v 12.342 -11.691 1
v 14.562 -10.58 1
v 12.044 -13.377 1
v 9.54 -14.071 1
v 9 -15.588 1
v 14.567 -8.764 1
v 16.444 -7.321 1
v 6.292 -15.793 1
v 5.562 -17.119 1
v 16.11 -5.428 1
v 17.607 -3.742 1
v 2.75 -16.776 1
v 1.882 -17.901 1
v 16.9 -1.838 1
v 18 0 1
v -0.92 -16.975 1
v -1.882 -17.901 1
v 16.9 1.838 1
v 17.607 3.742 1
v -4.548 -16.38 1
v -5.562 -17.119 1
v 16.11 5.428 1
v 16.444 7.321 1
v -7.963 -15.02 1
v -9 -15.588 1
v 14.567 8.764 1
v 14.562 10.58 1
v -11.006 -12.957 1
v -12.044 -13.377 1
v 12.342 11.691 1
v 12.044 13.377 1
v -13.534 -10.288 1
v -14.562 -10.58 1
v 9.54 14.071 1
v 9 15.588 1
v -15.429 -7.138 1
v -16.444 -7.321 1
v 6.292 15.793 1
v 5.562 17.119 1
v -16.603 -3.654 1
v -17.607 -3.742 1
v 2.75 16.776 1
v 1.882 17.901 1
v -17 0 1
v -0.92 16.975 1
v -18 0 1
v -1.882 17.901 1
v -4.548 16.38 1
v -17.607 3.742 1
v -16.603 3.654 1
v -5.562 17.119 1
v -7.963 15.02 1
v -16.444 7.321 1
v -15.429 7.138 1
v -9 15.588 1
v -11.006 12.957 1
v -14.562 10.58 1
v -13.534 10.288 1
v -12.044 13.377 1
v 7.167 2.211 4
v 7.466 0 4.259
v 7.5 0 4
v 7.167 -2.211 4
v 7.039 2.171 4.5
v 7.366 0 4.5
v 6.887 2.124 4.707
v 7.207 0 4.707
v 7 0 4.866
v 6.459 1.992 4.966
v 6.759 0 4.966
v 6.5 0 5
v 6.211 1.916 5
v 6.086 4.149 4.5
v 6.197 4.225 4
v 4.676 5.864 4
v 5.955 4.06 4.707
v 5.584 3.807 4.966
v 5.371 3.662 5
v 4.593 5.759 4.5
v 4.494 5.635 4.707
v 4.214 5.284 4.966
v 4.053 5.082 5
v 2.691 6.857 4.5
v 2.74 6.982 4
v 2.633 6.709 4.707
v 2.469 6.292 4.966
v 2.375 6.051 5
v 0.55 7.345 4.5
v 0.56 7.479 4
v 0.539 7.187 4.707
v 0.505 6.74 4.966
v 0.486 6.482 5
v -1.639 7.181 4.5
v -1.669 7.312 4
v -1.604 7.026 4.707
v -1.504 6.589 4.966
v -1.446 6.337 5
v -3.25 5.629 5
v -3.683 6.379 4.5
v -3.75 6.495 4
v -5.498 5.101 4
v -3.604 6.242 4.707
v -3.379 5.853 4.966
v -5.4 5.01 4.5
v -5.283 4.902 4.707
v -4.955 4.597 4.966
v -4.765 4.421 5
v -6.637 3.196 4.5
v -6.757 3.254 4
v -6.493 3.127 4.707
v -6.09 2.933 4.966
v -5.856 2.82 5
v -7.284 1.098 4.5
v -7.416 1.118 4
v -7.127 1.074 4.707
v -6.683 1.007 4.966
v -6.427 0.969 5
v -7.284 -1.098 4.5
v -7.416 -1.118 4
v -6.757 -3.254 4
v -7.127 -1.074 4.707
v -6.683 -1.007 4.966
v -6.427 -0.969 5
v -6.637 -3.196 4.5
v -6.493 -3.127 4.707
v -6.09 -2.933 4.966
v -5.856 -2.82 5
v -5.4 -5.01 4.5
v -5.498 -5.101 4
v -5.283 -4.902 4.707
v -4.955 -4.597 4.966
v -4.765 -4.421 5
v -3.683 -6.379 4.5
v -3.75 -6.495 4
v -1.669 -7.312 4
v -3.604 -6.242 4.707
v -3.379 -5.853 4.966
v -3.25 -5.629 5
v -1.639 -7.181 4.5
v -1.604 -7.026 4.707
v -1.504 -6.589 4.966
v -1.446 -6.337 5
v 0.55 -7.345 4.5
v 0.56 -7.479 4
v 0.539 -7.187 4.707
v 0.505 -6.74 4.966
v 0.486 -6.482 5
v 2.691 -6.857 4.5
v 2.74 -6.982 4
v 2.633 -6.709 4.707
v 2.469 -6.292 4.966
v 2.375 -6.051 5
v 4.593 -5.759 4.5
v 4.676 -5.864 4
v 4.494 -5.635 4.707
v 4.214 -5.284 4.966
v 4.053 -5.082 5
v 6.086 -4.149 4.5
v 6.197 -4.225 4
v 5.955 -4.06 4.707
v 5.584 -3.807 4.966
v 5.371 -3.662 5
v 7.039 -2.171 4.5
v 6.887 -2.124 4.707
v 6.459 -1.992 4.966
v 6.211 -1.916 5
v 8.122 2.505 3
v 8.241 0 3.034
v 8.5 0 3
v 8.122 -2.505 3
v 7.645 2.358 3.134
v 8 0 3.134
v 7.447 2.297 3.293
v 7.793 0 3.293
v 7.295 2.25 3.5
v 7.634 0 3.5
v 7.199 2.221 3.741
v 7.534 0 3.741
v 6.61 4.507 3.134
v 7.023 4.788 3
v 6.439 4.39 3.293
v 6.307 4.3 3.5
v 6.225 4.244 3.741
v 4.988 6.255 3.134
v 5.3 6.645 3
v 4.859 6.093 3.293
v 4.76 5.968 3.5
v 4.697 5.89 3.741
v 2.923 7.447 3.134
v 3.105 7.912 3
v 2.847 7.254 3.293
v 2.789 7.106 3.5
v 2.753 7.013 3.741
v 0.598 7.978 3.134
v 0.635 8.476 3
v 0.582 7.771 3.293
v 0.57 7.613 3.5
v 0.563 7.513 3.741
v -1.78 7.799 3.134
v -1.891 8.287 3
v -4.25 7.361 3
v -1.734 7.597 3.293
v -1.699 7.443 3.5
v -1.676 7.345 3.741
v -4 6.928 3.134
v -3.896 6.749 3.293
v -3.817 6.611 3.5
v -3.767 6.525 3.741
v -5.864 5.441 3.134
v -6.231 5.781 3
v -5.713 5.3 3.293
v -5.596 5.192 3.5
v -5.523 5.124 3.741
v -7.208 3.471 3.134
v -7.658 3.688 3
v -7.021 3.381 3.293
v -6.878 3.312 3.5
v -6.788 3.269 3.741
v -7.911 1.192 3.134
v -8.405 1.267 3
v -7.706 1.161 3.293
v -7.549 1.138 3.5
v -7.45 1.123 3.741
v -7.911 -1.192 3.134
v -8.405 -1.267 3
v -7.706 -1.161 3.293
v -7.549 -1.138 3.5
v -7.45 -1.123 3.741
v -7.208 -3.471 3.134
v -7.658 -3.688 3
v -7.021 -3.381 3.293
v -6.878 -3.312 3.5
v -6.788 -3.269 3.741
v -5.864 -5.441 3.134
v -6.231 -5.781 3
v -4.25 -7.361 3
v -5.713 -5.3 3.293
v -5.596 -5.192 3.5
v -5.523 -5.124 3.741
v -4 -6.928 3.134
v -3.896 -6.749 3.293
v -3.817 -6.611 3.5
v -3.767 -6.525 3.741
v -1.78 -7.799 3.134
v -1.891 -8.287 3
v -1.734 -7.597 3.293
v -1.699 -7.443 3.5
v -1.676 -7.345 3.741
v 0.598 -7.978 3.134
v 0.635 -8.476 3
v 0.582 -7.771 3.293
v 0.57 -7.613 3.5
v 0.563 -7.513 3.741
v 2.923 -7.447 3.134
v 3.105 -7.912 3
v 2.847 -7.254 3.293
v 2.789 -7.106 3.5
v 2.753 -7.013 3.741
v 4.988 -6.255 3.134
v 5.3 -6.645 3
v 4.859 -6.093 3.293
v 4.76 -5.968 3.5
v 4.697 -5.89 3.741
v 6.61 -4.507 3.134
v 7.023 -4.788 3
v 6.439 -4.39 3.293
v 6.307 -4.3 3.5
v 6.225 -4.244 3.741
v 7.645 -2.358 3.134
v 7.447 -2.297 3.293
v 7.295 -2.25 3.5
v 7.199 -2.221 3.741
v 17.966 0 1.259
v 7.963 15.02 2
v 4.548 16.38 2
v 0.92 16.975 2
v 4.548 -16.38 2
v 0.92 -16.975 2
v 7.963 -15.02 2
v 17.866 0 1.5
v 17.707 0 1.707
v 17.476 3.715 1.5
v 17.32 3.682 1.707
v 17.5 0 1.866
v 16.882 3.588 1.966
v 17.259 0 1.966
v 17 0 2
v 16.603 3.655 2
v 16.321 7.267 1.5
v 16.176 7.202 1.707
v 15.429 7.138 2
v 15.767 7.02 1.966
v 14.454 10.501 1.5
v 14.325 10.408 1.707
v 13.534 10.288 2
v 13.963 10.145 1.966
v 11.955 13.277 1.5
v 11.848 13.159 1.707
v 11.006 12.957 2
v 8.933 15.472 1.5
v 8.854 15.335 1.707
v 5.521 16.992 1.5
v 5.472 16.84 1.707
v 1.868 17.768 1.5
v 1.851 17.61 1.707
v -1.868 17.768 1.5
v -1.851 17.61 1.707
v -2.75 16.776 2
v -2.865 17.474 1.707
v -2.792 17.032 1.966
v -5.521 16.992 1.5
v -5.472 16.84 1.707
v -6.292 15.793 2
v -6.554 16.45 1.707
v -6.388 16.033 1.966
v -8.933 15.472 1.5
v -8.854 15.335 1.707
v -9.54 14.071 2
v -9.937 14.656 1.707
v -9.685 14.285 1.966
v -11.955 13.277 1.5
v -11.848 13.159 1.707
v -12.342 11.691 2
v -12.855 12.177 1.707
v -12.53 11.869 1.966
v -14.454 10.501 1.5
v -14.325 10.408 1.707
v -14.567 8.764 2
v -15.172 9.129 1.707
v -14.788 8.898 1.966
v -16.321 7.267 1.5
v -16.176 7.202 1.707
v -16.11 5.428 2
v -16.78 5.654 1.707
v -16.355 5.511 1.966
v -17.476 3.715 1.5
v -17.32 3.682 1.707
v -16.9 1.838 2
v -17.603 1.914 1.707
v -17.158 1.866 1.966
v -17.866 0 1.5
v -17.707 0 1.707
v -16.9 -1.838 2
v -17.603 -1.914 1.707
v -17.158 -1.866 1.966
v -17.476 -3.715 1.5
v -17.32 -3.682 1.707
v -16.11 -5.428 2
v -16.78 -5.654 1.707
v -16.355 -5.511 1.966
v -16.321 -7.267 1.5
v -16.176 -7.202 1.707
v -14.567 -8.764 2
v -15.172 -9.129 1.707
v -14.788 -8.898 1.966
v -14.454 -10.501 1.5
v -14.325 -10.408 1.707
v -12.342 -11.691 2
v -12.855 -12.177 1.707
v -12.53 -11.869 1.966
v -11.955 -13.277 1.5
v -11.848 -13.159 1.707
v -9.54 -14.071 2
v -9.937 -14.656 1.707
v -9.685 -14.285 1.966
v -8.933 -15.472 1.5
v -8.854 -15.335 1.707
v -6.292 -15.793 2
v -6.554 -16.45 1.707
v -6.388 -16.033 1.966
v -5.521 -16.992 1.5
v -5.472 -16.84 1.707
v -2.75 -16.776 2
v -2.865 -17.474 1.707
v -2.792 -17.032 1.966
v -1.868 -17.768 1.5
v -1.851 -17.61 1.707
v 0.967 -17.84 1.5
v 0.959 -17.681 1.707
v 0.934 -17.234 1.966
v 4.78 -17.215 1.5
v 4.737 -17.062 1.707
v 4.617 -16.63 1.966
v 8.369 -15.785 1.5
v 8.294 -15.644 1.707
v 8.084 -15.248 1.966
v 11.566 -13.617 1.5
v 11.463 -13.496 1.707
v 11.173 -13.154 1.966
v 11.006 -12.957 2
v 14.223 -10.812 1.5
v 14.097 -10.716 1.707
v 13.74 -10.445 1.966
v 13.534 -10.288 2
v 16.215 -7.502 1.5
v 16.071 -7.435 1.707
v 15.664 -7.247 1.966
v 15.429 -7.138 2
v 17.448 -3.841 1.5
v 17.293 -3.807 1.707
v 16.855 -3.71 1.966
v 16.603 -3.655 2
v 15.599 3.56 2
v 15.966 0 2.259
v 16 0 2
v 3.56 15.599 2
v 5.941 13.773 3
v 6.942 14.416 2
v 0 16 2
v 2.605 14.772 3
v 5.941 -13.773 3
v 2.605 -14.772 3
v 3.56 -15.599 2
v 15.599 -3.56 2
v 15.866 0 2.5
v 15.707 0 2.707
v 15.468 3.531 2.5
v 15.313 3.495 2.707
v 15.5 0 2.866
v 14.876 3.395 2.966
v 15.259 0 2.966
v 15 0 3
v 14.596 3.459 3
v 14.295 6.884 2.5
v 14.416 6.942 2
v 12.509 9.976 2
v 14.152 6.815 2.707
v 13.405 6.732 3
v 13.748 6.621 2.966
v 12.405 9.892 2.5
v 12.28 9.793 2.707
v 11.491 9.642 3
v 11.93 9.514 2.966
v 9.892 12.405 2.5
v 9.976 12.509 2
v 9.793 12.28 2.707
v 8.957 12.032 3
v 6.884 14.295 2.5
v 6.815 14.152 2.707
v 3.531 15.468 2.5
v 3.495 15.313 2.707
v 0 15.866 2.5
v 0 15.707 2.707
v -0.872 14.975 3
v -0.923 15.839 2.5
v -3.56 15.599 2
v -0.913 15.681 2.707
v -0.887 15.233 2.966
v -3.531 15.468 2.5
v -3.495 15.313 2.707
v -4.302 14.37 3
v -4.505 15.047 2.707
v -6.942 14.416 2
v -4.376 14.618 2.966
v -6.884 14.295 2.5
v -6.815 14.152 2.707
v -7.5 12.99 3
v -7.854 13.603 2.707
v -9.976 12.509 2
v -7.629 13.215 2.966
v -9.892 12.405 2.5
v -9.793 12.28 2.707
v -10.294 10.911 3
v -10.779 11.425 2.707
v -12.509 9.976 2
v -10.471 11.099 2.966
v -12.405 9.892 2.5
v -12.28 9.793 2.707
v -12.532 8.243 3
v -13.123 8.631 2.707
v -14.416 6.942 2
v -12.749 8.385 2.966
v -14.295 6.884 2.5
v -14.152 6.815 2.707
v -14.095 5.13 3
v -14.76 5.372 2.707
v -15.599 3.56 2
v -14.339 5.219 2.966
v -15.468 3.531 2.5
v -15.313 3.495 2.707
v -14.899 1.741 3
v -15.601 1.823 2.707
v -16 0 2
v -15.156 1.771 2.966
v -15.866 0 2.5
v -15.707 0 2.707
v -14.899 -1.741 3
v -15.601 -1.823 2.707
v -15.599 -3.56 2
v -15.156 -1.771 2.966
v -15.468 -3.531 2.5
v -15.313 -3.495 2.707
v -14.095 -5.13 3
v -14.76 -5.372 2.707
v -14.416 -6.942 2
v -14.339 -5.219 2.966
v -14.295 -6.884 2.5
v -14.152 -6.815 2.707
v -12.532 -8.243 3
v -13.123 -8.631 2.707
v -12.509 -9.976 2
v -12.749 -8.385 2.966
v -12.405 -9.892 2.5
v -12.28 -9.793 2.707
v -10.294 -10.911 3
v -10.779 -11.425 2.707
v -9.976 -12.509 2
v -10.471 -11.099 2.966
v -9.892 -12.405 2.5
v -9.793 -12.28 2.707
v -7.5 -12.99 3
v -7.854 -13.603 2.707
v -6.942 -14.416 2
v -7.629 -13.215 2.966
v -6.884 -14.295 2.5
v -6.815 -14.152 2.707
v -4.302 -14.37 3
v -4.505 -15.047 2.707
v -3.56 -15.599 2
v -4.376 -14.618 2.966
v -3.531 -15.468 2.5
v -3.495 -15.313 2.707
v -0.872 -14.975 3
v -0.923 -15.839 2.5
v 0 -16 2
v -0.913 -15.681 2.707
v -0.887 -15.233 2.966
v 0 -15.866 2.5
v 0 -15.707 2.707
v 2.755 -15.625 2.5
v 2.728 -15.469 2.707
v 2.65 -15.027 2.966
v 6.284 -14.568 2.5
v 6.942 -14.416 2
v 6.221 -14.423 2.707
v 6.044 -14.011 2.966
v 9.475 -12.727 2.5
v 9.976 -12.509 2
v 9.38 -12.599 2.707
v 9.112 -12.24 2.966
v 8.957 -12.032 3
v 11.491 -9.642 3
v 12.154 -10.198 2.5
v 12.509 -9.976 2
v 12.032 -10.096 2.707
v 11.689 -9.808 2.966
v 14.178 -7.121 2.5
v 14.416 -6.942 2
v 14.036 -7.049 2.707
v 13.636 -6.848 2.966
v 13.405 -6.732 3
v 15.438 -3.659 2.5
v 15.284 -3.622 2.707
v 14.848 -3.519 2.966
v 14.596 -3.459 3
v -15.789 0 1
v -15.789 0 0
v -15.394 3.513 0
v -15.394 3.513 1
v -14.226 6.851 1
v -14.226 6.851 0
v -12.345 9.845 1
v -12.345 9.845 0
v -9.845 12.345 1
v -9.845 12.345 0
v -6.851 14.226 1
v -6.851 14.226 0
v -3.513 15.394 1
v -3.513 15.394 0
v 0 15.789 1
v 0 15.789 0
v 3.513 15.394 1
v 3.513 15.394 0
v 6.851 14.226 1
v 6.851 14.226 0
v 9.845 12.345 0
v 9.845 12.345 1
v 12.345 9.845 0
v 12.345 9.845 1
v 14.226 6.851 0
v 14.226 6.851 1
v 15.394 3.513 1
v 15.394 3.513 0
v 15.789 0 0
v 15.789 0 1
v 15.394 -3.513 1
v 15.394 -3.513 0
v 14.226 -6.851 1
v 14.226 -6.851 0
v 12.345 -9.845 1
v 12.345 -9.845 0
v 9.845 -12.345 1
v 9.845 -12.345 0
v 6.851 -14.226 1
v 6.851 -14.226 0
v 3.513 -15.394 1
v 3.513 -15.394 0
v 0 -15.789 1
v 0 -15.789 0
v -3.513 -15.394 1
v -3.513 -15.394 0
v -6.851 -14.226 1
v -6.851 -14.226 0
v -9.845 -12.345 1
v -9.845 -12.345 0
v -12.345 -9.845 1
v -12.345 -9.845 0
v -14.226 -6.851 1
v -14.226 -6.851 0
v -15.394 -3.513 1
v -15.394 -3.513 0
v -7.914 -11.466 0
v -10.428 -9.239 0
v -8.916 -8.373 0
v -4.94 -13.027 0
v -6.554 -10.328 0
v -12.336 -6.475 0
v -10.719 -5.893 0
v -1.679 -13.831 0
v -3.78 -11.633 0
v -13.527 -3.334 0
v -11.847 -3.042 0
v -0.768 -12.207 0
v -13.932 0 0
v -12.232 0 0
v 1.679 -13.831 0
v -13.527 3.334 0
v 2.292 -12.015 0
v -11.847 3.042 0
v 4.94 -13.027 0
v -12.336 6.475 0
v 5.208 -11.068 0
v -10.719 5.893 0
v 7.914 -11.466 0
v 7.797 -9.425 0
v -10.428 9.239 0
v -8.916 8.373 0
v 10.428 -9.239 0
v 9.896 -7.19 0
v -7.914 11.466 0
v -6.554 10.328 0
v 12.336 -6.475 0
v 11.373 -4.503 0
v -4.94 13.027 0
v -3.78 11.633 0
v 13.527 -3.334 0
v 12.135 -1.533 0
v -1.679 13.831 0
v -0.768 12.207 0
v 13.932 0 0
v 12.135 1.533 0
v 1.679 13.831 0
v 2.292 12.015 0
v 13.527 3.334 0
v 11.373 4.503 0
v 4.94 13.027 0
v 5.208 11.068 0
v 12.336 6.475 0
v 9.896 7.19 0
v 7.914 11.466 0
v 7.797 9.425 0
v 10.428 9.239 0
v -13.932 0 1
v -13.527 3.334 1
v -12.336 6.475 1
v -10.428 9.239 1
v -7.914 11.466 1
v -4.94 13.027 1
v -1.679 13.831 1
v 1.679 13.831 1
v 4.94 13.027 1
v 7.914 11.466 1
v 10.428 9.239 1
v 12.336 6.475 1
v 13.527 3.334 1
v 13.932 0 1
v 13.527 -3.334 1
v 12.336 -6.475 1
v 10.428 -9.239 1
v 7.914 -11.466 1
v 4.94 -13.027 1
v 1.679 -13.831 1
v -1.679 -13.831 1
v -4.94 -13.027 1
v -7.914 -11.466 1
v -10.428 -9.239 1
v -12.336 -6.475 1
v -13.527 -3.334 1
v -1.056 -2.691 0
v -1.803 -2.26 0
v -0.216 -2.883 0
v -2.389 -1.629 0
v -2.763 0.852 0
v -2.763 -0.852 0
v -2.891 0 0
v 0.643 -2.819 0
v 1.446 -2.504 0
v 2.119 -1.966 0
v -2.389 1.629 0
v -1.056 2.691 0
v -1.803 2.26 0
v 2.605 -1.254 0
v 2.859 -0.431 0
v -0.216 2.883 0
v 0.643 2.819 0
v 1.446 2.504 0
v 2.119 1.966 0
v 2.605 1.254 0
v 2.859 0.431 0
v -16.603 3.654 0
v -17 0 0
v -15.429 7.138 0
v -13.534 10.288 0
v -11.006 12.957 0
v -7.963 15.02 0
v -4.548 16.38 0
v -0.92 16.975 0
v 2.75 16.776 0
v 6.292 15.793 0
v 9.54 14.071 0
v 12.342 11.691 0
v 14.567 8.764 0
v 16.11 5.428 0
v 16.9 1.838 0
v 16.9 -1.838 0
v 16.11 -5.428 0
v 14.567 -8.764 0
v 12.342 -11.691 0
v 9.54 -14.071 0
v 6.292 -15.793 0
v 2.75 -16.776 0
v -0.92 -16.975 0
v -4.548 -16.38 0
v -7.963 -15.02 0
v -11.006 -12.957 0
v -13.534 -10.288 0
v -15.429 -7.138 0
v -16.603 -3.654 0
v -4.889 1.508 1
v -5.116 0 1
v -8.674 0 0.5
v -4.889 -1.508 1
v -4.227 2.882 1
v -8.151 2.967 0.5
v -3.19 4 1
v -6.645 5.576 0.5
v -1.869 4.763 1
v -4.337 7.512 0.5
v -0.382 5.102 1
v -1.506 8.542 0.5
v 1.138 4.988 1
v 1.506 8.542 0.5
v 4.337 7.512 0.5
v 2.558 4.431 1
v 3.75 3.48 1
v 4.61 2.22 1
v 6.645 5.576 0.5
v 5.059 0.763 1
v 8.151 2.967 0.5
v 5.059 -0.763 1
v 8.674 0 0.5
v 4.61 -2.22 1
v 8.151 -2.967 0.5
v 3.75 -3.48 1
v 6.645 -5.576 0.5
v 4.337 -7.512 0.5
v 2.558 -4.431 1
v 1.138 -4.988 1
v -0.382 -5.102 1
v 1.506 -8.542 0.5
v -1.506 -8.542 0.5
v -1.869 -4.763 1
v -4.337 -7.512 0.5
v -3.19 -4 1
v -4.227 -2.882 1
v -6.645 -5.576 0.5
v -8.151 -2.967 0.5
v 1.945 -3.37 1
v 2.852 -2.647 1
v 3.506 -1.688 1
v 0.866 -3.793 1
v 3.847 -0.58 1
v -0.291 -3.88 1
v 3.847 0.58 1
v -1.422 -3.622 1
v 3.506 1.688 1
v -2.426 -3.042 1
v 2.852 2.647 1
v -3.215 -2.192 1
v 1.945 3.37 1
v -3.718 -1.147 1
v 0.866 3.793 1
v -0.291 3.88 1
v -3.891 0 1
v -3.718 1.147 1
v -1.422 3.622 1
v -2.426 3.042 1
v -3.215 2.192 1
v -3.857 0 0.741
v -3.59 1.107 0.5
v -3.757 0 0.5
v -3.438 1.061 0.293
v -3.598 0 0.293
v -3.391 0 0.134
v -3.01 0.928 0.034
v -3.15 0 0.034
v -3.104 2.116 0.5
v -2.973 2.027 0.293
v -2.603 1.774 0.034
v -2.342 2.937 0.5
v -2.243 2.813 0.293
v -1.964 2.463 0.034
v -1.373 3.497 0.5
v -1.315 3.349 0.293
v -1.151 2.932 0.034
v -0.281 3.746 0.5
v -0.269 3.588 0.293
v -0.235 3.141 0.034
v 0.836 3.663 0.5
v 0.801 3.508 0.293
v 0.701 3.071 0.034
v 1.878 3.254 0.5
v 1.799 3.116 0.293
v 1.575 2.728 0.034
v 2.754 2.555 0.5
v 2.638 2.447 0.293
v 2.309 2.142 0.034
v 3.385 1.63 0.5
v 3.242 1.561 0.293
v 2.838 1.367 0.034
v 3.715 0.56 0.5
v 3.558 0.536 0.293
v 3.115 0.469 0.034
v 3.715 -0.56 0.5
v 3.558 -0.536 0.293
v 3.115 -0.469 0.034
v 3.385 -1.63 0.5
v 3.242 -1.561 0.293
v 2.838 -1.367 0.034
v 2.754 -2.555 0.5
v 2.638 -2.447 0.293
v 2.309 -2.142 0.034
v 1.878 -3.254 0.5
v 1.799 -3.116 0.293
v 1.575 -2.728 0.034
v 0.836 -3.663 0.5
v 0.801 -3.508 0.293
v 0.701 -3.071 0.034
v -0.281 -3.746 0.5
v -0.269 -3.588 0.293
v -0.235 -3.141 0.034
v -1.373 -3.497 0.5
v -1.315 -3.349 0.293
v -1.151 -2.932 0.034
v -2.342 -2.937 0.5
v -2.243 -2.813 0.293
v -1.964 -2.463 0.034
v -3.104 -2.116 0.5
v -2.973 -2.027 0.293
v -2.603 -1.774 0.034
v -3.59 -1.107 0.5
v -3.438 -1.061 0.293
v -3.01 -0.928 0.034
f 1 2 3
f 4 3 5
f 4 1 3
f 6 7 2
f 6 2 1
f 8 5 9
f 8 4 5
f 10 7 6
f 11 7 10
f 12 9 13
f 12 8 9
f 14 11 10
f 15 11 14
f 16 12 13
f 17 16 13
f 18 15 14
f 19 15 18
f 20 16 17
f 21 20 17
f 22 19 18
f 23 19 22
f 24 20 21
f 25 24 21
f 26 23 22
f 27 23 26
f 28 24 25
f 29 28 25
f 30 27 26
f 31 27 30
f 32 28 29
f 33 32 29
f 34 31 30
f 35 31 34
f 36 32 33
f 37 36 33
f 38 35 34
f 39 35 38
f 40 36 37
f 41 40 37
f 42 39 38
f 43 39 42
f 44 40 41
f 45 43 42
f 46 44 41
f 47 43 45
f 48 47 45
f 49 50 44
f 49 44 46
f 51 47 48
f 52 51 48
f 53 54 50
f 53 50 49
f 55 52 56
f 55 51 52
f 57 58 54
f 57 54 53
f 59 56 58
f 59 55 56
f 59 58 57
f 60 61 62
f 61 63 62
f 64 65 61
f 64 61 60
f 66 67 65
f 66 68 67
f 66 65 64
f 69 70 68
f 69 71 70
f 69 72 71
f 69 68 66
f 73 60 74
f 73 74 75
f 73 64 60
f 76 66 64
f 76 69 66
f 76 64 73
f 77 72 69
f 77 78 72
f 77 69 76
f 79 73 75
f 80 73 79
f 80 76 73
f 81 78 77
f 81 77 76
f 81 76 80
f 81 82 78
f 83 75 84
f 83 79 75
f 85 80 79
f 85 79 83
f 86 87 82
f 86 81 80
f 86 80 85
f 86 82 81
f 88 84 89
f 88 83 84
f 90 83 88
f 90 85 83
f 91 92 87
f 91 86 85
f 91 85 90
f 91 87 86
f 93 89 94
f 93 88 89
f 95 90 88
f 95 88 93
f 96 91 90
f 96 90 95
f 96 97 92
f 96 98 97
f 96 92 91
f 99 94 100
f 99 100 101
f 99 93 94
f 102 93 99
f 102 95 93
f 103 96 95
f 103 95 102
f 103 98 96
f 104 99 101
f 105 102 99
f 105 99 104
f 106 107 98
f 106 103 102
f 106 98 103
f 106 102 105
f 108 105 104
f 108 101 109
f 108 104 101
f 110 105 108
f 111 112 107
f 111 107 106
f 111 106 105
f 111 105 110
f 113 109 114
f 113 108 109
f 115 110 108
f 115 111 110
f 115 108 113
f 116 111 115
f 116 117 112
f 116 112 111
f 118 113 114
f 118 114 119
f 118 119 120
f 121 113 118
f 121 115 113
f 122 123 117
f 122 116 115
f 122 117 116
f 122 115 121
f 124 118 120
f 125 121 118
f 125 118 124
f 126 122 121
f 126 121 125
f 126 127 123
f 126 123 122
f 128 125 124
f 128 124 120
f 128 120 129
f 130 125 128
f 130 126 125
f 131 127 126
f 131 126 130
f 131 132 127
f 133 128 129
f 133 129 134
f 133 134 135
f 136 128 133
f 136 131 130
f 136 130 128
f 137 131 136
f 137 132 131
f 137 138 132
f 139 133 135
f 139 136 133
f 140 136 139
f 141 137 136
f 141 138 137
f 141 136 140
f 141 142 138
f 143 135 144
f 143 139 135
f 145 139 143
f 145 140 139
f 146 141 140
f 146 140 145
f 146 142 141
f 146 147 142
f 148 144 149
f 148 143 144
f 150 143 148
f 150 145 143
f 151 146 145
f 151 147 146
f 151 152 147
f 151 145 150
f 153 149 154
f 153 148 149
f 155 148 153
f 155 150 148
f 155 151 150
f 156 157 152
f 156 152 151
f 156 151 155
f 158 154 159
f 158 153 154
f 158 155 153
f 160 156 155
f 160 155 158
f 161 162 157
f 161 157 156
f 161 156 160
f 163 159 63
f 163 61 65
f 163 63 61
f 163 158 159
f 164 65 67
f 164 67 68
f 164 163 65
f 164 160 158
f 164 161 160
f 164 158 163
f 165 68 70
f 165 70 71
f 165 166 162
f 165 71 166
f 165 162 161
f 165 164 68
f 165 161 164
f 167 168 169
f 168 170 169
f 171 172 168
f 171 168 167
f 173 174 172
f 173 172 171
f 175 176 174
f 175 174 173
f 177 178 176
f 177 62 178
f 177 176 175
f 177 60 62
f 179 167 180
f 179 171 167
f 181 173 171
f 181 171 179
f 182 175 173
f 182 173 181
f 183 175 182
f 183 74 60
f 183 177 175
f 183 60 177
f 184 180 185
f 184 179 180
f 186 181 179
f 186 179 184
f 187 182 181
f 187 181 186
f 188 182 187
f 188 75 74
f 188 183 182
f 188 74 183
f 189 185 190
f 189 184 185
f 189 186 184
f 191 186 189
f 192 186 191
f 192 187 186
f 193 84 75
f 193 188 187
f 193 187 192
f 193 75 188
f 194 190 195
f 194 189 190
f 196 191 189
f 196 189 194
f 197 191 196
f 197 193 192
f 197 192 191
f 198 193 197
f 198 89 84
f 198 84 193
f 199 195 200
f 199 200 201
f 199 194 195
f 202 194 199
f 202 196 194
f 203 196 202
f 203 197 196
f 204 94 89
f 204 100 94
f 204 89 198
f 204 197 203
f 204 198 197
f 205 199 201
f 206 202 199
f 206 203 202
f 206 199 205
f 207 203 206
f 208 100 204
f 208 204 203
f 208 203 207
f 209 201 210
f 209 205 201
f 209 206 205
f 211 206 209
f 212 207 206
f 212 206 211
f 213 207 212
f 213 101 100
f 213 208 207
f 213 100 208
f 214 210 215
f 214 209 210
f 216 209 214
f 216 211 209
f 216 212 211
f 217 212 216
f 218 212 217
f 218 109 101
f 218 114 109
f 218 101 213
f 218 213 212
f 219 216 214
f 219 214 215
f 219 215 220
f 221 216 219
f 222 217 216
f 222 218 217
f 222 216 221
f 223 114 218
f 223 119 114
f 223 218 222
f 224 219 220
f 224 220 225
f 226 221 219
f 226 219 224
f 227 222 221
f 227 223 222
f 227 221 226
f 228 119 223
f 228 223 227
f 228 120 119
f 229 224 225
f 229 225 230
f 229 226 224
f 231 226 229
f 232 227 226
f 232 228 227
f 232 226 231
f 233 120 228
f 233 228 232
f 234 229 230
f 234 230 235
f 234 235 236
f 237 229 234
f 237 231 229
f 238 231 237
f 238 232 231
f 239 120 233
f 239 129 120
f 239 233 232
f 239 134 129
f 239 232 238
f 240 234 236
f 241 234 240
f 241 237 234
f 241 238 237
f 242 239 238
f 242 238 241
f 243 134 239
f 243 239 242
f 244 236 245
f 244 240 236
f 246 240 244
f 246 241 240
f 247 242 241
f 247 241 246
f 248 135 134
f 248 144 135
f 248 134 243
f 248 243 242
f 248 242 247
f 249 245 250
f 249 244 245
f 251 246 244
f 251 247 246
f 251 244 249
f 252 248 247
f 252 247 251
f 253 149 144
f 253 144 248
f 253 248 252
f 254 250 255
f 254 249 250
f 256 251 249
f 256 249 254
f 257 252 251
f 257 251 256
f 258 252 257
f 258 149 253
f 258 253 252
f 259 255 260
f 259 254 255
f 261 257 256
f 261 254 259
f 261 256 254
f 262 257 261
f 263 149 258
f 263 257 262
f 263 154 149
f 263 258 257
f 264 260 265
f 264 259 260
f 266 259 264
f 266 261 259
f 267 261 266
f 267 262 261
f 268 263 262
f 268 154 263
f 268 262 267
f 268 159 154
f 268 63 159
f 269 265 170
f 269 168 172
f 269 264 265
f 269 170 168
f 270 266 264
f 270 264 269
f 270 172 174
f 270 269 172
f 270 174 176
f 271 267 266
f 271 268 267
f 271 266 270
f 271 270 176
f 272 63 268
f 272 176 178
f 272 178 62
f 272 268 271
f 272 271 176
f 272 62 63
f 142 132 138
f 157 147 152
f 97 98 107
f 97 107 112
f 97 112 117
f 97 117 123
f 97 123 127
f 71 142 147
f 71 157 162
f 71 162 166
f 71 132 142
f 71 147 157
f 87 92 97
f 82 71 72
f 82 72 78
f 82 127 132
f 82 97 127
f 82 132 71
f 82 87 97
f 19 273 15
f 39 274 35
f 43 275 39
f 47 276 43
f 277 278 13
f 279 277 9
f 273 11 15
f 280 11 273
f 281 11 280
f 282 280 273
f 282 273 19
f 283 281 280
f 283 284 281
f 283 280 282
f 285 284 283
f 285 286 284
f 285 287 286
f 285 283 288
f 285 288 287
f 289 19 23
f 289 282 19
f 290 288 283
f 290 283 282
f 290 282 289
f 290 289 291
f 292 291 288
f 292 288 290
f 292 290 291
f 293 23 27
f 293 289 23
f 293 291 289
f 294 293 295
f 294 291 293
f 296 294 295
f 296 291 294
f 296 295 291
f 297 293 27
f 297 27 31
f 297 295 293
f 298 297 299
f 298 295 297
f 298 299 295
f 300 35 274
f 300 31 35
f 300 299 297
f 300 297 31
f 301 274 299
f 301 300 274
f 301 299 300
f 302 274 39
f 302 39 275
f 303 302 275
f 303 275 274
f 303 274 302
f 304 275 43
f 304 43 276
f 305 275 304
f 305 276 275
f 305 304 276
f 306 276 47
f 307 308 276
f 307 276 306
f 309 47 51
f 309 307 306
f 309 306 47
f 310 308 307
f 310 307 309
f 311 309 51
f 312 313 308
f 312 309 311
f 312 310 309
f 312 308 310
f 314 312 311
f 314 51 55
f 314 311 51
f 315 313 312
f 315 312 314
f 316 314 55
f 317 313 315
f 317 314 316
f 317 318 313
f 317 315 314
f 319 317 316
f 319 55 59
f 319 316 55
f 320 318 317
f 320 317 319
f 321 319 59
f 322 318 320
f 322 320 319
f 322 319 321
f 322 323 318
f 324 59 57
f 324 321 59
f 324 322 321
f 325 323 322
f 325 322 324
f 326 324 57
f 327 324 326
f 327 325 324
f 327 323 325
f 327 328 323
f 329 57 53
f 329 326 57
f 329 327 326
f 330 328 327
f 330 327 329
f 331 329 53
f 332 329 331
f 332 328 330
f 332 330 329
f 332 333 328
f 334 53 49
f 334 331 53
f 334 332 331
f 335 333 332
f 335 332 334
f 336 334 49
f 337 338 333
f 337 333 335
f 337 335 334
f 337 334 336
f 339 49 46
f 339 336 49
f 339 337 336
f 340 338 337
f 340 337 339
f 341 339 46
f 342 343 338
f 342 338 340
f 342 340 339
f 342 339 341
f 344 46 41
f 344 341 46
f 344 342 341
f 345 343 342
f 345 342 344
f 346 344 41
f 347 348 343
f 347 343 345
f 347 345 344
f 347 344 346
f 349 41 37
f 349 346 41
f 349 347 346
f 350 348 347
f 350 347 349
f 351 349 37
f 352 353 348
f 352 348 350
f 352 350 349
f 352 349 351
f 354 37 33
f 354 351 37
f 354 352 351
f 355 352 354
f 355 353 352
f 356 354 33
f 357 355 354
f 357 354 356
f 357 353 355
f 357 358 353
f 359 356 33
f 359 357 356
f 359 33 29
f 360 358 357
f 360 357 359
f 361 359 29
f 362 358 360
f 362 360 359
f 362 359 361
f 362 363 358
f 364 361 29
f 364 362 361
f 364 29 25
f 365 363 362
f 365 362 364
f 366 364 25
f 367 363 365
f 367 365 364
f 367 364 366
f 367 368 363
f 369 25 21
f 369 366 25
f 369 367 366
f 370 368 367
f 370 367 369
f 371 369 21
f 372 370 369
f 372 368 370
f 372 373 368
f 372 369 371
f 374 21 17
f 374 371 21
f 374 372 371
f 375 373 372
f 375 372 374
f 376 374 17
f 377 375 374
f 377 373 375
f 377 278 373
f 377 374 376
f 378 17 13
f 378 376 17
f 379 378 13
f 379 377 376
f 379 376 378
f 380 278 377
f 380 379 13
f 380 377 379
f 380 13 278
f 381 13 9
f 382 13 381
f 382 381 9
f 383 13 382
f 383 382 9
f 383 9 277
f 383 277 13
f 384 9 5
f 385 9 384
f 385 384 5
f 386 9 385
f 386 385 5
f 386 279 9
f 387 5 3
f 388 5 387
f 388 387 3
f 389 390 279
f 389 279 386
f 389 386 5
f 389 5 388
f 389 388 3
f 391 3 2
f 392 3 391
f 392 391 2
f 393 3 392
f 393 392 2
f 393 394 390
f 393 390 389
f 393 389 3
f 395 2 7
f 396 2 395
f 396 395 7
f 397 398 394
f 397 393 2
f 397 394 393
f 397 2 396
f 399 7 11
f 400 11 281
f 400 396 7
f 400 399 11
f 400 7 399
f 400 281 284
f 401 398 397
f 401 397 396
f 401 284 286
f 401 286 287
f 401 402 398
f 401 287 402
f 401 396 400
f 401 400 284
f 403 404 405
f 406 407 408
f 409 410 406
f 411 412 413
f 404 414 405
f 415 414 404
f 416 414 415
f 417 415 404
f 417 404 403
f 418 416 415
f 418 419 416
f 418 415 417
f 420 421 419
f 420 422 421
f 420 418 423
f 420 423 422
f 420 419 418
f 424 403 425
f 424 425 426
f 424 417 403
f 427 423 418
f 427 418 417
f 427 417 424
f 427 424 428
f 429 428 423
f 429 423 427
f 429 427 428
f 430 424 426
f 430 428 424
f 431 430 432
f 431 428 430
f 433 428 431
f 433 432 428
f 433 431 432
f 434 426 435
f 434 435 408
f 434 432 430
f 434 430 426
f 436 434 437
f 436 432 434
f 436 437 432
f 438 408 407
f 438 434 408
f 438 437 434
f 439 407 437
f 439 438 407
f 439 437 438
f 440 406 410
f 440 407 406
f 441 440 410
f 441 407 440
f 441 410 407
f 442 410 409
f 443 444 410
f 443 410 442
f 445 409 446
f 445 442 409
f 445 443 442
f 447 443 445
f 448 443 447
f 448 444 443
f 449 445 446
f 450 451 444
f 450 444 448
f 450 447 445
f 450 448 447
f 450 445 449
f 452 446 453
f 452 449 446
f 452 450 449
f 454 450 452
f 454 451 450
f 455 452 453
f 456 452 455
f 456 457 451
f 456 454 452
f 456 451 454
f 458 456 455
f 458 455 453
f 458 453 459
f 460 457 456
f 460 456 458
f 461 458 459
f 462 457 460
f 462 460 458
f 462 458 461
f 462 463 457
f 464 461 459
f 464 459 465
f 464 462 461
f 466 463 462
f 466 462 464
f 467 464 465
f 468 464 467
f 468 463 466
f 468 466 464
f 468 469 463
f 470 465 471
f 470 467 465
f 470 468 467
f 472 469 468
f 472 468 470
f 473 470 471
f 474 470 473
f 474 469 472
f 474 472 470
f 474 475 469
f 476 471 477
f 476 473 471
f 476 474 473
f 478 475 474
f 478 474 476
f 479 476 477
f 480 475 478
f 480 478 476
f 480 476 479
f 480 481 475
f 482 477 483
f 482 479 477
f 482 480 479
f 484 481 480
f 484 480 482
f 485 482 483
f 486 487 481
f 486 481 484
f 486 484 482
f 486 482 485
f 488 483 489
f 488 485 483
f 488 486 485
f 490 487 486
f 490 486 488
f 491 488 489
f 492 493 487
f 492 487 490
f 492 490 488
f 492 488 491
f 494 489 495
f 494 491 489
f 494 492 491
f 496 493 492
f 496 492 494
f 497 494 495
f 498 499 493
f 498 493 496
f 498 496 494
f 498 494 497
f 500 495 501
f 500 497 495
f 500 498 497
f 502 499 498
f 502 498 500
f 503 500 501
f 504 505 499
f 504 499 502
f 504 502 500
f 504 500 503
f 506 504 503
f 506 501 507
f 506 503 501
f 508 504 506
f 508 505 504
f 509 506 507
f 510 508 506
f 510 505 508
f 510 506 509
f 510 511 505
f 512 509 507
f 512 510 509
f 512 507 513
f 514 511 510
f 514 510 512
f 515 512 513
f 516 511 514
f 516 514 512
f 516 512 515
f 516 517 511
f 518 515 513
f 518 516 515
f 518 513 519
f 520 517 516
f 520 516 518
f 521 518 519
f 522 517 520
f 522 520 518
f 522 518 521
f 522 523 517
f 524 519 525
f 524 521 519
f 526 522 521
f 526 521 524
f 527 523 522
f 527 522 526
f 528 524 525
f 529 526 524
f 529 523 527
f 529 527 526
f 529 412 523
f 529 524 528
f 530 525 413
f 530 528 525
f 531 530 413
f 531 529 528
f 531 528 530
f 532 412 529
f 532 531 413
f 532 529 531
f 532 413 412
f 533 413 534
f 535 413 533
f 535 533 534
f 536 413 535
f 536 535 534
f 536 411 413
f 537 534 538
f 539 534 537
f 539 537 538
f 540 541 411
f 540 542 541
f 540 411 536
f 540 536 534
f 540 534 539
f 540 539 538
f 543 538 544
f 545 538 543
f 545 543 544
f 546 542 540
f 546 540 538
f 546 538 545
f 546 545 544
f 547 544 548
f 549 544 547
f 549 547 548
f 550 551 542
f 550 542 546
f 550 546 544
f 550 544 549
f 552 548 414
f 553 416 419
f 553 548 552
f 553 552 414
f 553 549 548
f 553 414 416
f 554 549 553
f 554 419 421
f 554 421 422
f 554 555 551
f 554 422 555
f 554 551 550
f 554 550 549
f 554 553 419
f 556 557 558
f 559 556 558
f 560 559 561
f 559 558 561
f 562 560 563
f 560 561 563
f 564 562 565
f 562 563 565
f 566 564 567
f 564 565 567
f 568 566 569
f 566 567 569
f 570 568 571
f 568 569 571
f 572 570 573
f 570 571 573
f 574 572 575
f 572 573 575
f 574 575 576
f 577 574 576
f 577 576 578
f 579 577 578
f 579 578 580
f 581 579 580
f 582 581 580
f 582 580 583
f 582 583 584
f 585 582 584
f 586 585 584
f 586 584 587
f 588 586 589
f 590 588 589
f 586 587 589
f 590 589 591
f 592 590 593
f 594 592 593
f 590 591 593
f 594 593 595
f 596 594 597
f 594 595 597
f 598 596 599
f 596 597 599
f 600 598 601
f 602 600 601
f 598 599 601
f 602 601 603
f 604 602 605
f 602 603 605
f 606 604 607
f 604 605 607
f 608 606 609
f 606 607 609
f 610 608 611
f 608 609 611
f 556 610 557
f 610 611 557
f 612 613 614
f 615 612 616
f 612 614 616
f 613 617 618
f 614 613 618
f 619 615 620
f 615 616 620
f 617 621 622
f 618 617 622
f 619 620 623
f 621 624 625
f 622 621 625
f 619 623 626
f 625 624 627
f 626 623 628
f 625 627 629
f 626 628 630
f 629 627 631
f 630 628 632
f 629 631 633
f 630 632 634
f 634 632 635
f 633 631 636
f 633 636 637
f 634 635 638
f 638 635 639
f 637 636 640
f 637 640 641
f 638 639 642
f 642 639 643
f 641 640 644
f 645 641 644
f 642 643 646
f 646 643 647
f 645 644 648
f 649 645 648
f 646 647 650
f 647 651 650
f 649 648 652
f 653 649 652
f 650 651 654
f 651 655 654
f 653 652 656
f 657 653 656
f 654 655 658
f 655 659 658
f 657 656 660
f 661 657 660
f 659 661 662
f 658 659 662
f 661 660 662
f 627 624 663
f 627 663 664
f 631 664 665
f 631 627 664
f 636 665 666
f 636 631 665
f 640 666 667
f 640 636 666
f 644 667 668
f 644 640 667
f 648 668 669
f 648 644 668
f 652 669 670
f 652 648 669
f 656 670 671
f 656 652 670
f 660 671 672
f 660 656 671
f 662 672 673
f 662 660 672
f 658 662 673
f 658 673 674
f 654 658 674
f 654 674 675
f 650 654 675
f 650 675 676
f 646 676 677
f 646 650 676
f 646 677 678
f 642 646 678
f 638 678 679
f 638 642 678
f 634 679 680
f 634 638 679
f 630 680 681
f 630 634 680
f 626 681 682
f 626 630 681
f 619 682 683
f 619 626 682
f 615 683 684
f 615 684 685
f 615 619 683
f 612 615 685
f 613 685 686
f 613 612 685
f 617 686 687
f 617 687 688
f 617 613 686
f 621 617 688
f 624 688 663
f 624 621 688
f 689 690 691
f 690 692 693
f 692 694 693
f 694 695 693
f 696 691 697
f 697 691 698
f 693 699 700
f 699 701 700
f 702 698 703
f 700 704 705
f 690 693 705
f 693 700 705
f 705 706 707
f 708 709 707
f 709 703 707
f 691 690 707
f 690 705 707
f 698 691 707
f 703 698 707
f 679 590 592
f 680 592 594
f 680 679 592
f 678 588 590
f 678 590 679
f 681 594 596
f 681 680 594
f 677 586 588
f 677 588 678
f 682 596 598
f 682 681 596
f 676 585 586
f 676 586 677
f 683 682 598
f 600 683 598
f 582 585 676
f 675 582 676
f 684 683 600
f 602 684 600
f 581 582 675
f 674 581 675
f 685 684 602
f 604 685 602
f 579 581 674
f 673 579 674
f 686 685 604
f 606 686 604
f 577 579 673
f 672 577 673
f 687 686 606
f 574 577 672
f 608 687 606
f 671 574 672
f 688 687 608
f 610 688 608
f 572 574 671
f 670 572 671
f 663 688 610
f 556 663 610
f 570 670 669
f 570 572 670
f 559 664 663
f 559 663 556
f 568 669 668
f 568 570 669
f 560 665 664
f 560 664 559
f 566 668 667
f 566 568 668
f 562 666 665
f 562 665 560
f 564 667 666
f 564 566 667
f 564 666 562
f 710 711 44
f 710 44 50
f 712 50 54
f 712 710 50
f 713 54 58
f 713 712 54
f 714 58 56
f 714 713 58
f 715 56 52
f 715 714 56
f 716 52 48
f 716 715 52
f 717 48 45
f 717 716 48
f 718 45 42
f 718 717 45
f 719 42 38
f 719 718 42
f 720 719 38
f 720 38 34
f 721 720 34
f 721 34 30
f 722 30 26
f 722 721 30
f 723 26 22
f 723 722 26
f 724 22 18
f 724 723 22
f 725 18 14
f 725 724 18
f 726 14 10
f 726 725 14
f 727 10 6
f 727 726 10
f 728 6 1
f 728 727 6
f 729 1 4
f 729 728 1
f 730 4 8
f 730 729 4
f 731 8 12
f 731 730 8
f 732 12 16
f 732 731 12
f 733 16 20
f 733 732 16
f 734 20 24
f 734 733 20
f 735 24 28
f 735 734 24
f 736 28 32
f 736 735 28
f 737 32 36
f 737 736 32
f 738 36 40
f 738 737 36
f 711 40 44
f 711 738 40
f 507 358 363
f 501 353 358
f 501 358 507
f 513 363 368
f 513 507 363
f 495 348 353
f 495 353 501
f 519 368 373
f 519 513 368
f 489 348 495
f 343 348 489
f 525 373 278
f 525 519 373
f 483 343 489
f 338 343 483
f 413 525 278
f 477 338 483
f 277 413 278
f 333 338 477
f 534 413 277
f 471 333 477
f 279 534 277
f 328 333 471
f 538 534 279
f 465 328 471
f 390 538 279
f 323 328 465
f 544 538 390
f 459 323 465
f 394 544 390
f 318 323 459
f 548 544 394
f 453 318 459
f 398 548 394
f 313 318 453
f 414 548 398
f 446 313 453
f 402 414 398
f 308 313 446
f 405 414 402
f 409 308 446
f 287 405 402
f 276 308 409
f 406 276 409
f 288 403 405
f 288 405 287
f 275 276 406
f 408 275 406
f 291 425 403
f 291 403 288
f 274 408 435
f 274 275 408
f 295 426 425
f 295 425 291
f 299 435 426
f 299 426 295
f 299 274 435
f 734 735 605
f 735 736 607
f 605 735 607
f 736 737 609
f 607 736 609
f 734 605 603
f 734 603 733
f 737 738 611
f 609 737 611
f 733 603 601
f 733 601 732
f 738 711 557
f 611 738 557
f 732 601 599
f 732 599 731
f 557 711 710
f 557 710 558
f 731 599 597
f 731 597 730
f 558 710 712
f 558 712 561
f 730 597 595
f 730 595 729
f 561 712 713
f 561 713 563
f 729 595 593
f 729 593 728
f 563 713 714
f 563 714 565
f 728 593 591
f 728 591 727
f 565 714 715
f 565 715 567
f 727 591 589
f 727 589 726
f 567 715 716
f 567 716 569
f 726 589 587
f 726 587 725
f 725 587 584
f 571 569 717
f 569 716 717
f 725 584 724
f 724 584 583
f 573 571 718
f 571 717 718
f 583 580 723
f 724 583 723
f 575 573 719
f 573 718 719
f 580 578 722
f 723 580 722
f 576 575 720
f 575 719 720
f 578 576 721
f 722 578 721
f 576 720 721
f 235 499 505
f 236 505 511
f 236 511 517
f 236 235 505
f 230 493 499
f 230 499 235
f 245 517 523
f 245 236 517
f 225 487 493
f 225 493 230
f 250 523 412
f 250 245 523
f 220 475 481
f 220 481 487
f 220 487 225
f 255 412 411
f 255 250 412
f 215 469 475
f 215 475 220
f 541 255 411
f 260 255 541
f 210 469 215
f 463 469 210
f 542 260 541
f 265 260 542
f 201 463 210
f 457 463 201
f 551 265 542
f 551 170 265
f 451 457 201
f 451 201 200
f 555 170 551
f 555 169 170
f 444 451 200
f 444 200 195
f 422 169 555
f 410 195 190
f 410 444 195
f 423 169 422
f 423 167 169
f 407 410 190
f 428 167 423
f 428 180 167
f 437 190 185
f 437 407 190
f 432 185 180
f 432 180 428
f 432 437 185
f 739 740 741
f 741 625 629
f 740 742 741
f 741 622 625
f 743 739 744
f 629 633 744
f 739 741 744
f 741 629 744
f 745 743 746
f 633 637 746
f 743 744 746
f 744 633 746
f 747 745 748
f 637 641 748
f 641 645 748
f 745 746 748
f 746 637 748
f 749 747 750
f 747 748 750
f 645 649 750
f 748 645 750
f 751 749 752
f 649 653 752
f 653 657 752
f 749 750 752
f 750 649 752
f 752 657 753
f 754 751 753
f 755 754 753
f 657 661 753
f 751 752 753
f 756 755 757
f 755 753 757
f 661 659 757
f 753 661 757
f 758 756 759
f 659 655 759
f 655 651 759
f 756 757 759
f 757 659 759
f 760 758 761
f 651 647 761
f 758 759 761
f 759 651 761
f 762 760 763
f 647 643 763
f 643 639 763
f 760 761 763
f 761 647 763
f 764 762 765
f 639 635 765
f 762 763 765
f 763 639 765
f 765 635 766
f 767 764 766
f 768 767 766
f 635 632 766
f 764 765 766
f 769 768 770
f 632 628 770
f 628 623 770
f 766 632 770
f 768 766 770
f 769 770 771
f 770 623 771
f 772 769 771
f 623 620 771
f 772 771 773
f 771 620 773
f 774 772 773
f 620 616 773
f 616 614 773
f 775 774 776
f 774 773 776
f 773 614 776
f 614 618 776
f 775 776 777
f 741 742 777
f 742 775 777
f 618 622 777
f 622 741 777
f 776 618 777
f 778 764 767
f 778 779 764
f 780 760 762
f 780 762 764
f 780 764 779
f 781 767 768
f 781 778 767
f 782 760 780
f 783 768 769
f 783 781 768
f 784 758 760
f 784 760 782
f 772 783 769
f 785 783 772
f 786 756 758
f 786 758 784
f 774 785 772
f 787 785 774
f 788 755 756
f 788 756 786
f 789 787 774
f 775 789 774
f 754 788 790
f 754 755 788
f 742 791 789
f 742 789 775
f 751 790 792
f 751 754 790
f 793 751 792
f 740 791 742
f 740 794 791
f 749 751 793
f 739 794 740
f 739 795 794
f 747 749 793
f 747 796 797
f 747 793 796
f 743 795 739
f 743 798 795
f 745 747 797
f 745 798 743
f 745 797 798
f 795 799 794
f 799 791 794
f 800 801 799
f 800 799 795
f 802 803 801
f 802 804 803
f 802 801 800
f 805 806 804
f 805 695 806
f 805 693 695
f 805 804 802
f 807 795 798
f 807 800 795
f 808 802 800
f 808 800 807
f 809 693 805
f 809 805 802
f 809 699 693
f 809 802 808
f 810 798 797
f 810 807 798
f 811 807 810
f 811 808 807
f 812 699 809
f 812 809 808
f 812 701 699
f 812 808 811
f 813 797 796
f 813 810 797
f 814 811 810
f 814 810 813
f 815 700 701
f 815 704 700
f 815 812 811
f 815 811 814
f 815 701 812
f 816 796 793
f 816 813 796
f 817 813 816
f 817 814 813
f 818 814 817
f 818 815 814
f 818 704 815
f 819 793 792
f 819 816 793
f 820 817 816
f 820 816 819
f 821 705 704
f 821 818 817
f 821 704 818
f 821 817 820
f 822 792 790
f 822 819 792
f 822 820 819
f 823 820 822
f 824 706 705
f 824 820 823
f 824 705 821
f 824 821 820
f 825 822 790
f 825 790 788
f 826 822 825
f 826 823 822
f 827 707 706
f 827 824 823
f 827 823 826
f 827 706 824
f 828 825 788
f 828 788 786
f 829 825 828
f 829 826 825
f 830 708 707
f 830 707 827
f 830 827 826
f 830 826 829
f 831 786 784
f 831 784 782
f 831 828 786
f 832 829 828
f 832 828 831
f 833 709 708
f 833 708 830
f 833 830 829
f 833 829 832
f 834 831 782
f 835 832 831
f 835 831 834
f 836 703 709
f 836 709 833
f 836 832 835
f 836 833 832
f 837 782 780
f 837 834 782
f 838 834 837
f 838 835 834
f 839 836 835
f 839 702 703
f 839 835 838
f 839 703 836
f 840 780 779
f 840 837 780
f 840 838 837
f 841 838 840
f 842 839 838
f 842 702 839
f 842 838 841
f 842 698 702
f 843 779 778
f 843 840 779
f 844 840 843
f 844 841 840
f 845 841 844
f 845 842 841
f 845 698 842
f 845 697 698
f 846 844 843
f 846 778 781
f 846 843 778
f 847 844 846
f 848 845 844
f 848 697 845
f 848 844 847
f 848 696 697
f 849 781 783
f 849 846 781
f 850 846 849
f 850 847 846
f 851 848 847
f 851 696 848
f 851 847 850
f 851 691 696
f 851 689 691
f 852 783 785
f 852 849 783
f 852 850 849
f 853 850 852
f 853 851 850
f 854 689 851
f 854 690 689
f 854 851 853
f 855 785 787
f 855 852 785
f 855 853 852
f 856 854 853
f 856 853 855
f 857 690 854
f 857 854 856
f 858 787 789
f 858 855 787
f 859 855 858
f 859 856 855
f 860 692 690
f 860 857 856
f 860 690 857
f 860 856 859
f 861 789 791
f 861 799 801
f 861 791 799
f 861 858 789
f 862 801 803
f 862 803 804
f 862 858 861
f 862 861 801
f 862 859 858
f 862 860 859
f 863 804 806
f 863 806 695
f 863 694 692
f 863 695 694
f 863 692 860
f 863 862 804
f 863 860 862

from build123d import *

# Parameters (mm, degrees)
SKETCH1_R           = 18
BOSS_EXTRUDE1_DEPTH = 2
SKETCH2_R           = 16
BOSS_EXTRUDE2_DEPTH = 1
SKETCH3_R           = 7.5
BOSS_EXTRUDE3_DEPTH = 2
FILLET2_R           = 1
SKETCH4_R           = 18
SKETCH4_R_2         = 17
CUT_EXTRUDE1_DEPTH  = 1
SKETCH5_R           = 15.789460751
SKETCH5_R_2         = 13.932235083
CUT_EXTRUDE2_DEPTH  = 1
SKETCH6_R           = 12.231632463
SKETCH6_R_2         = 3.890953776
CUT_EXTRUDE3_DEPTH  = 1
FILLET3_R           = 1
CHAMFER1_SIZE       = 7.115369722
CHAMFER1_SIZE_2     = 1


# Some blends are built 0.0001 mm under size
with BuildPart() as part:
    # Sketch1 → Boss-Extrude1 (new body)
    with BuildSketch(Plane.XY):
        Circle(SKETCH1_R)
    extrude(amount=BOSS_EXTRUDE1_DEPTH)

    # Sketch2 → Boss-Extrude2 (add)
    with BuildSketch(Plane.XY.offset(2)):
        Circle(SKETCH2_R)
    extrude(amount=BOSS_EXTRUDE2_DEPTH)

    # Sketch3 → Boss-Extrude3 (add)
    with BuildSketch(Plane.XY.offset(3)):
        Circle(SKETCH3_R)
    extrude(amount=BOSS_EXTRUDE3_DEPTH)

    # Fillet2
    fillet2_edges = [part.edges().sort_by_distance(p)[0] for p in [
        (-7.5, 0, 3),
        (-7.5, 0, 5),
        (-18, 0, 2),
        (-16, 0, 3),
    ]]
    fillet(fillet2_edges, radius=FILLET2_R - 0.0001)  # a hair under: the kernel refuses the full size

    # Sketch4 → Cut-Extrude1 (cut)
    with BuildSketch(Plane(origin=(0, 0, 0), x_dir=(-1, 0, 0), z_dir=(0, 0, -1))):
        Circle(SKETCH4_R)
        Circle(SKETCH4_R_2, mode=Mode.SUBTRACT)
    extrude(amount=-CUT_EXTRUDE1_DEPTH, mode=Mode.SUBTRACT)

    # Sketch5 → Cut-Extrude2 (cut)
    with BuildSketch(Plane(origin=(0, 0, 0), x_dir=(-1, 0, 0), z_dir=(0, 0, -1))):
        Circle(SKETCH5_R)
        Circle(SKETCH5_R_2, mode=Mode.SUBTRACT)
    extrude(amount=-CUT_EXTRUDE2_DEPTH, mode=Mode.SUBTRACT)

    # Sketch6 → Cut-Extrude3 (cut)
    with BuildSketch(Plane(origin=(0, 0, 0), x_dir=(-1, 0, 0), z_dir=(0, 0, -1))):
        Circle(SKETCH6_R)
        Circle(SKETCH6_R_2, mode=Mode.SUBTRACT)
    extrude(amount=-CUT_EXTRUDE3_DEPTH, mode=Mode.SUBTRACT)

    # Fillet3
    fillet3_edges = [part.edges().sort_by_distance(p)[0] for p in [
        (3.890953776, 0, 0),
    ]]
    fillet(fillet3_edges, radius=FILLET3_R - 0.0001)  # a hair under: the kernel refuses the full size

    # Chamfer1
    # the kernel refuses this chamfer: 7.115369722, 1 mm, written as the material it adds along each edge
    with BuildSketch(Plane(origin=(0, 0, 1), x_dir=(-1, 0, 0), z_dir=(0, -1, 0))) as chamfer1_piece_1_section:
        Polygon((12.231632463 - CHAMFER1_SIZE, 0), (12.231632463, CHAMFER1_SIZE_2), (12.231632463, 0), align=None)
    chamfer1_piece_1 = revolve(axis=Axis((0, 0, 1), (0, 0, -1)), mode=Mode.PRIVATE)
    chamfer1_piece_1 = split(chamfer1_piece_1, bisect_by=Plane(origin=(8.54226682, 0, 0), z_dir=(0, 0, 1)), keep=Keep.TOP, mode=Mode.PRIVATE)
    add(chamfer1_piece_1)


solid = part.part
